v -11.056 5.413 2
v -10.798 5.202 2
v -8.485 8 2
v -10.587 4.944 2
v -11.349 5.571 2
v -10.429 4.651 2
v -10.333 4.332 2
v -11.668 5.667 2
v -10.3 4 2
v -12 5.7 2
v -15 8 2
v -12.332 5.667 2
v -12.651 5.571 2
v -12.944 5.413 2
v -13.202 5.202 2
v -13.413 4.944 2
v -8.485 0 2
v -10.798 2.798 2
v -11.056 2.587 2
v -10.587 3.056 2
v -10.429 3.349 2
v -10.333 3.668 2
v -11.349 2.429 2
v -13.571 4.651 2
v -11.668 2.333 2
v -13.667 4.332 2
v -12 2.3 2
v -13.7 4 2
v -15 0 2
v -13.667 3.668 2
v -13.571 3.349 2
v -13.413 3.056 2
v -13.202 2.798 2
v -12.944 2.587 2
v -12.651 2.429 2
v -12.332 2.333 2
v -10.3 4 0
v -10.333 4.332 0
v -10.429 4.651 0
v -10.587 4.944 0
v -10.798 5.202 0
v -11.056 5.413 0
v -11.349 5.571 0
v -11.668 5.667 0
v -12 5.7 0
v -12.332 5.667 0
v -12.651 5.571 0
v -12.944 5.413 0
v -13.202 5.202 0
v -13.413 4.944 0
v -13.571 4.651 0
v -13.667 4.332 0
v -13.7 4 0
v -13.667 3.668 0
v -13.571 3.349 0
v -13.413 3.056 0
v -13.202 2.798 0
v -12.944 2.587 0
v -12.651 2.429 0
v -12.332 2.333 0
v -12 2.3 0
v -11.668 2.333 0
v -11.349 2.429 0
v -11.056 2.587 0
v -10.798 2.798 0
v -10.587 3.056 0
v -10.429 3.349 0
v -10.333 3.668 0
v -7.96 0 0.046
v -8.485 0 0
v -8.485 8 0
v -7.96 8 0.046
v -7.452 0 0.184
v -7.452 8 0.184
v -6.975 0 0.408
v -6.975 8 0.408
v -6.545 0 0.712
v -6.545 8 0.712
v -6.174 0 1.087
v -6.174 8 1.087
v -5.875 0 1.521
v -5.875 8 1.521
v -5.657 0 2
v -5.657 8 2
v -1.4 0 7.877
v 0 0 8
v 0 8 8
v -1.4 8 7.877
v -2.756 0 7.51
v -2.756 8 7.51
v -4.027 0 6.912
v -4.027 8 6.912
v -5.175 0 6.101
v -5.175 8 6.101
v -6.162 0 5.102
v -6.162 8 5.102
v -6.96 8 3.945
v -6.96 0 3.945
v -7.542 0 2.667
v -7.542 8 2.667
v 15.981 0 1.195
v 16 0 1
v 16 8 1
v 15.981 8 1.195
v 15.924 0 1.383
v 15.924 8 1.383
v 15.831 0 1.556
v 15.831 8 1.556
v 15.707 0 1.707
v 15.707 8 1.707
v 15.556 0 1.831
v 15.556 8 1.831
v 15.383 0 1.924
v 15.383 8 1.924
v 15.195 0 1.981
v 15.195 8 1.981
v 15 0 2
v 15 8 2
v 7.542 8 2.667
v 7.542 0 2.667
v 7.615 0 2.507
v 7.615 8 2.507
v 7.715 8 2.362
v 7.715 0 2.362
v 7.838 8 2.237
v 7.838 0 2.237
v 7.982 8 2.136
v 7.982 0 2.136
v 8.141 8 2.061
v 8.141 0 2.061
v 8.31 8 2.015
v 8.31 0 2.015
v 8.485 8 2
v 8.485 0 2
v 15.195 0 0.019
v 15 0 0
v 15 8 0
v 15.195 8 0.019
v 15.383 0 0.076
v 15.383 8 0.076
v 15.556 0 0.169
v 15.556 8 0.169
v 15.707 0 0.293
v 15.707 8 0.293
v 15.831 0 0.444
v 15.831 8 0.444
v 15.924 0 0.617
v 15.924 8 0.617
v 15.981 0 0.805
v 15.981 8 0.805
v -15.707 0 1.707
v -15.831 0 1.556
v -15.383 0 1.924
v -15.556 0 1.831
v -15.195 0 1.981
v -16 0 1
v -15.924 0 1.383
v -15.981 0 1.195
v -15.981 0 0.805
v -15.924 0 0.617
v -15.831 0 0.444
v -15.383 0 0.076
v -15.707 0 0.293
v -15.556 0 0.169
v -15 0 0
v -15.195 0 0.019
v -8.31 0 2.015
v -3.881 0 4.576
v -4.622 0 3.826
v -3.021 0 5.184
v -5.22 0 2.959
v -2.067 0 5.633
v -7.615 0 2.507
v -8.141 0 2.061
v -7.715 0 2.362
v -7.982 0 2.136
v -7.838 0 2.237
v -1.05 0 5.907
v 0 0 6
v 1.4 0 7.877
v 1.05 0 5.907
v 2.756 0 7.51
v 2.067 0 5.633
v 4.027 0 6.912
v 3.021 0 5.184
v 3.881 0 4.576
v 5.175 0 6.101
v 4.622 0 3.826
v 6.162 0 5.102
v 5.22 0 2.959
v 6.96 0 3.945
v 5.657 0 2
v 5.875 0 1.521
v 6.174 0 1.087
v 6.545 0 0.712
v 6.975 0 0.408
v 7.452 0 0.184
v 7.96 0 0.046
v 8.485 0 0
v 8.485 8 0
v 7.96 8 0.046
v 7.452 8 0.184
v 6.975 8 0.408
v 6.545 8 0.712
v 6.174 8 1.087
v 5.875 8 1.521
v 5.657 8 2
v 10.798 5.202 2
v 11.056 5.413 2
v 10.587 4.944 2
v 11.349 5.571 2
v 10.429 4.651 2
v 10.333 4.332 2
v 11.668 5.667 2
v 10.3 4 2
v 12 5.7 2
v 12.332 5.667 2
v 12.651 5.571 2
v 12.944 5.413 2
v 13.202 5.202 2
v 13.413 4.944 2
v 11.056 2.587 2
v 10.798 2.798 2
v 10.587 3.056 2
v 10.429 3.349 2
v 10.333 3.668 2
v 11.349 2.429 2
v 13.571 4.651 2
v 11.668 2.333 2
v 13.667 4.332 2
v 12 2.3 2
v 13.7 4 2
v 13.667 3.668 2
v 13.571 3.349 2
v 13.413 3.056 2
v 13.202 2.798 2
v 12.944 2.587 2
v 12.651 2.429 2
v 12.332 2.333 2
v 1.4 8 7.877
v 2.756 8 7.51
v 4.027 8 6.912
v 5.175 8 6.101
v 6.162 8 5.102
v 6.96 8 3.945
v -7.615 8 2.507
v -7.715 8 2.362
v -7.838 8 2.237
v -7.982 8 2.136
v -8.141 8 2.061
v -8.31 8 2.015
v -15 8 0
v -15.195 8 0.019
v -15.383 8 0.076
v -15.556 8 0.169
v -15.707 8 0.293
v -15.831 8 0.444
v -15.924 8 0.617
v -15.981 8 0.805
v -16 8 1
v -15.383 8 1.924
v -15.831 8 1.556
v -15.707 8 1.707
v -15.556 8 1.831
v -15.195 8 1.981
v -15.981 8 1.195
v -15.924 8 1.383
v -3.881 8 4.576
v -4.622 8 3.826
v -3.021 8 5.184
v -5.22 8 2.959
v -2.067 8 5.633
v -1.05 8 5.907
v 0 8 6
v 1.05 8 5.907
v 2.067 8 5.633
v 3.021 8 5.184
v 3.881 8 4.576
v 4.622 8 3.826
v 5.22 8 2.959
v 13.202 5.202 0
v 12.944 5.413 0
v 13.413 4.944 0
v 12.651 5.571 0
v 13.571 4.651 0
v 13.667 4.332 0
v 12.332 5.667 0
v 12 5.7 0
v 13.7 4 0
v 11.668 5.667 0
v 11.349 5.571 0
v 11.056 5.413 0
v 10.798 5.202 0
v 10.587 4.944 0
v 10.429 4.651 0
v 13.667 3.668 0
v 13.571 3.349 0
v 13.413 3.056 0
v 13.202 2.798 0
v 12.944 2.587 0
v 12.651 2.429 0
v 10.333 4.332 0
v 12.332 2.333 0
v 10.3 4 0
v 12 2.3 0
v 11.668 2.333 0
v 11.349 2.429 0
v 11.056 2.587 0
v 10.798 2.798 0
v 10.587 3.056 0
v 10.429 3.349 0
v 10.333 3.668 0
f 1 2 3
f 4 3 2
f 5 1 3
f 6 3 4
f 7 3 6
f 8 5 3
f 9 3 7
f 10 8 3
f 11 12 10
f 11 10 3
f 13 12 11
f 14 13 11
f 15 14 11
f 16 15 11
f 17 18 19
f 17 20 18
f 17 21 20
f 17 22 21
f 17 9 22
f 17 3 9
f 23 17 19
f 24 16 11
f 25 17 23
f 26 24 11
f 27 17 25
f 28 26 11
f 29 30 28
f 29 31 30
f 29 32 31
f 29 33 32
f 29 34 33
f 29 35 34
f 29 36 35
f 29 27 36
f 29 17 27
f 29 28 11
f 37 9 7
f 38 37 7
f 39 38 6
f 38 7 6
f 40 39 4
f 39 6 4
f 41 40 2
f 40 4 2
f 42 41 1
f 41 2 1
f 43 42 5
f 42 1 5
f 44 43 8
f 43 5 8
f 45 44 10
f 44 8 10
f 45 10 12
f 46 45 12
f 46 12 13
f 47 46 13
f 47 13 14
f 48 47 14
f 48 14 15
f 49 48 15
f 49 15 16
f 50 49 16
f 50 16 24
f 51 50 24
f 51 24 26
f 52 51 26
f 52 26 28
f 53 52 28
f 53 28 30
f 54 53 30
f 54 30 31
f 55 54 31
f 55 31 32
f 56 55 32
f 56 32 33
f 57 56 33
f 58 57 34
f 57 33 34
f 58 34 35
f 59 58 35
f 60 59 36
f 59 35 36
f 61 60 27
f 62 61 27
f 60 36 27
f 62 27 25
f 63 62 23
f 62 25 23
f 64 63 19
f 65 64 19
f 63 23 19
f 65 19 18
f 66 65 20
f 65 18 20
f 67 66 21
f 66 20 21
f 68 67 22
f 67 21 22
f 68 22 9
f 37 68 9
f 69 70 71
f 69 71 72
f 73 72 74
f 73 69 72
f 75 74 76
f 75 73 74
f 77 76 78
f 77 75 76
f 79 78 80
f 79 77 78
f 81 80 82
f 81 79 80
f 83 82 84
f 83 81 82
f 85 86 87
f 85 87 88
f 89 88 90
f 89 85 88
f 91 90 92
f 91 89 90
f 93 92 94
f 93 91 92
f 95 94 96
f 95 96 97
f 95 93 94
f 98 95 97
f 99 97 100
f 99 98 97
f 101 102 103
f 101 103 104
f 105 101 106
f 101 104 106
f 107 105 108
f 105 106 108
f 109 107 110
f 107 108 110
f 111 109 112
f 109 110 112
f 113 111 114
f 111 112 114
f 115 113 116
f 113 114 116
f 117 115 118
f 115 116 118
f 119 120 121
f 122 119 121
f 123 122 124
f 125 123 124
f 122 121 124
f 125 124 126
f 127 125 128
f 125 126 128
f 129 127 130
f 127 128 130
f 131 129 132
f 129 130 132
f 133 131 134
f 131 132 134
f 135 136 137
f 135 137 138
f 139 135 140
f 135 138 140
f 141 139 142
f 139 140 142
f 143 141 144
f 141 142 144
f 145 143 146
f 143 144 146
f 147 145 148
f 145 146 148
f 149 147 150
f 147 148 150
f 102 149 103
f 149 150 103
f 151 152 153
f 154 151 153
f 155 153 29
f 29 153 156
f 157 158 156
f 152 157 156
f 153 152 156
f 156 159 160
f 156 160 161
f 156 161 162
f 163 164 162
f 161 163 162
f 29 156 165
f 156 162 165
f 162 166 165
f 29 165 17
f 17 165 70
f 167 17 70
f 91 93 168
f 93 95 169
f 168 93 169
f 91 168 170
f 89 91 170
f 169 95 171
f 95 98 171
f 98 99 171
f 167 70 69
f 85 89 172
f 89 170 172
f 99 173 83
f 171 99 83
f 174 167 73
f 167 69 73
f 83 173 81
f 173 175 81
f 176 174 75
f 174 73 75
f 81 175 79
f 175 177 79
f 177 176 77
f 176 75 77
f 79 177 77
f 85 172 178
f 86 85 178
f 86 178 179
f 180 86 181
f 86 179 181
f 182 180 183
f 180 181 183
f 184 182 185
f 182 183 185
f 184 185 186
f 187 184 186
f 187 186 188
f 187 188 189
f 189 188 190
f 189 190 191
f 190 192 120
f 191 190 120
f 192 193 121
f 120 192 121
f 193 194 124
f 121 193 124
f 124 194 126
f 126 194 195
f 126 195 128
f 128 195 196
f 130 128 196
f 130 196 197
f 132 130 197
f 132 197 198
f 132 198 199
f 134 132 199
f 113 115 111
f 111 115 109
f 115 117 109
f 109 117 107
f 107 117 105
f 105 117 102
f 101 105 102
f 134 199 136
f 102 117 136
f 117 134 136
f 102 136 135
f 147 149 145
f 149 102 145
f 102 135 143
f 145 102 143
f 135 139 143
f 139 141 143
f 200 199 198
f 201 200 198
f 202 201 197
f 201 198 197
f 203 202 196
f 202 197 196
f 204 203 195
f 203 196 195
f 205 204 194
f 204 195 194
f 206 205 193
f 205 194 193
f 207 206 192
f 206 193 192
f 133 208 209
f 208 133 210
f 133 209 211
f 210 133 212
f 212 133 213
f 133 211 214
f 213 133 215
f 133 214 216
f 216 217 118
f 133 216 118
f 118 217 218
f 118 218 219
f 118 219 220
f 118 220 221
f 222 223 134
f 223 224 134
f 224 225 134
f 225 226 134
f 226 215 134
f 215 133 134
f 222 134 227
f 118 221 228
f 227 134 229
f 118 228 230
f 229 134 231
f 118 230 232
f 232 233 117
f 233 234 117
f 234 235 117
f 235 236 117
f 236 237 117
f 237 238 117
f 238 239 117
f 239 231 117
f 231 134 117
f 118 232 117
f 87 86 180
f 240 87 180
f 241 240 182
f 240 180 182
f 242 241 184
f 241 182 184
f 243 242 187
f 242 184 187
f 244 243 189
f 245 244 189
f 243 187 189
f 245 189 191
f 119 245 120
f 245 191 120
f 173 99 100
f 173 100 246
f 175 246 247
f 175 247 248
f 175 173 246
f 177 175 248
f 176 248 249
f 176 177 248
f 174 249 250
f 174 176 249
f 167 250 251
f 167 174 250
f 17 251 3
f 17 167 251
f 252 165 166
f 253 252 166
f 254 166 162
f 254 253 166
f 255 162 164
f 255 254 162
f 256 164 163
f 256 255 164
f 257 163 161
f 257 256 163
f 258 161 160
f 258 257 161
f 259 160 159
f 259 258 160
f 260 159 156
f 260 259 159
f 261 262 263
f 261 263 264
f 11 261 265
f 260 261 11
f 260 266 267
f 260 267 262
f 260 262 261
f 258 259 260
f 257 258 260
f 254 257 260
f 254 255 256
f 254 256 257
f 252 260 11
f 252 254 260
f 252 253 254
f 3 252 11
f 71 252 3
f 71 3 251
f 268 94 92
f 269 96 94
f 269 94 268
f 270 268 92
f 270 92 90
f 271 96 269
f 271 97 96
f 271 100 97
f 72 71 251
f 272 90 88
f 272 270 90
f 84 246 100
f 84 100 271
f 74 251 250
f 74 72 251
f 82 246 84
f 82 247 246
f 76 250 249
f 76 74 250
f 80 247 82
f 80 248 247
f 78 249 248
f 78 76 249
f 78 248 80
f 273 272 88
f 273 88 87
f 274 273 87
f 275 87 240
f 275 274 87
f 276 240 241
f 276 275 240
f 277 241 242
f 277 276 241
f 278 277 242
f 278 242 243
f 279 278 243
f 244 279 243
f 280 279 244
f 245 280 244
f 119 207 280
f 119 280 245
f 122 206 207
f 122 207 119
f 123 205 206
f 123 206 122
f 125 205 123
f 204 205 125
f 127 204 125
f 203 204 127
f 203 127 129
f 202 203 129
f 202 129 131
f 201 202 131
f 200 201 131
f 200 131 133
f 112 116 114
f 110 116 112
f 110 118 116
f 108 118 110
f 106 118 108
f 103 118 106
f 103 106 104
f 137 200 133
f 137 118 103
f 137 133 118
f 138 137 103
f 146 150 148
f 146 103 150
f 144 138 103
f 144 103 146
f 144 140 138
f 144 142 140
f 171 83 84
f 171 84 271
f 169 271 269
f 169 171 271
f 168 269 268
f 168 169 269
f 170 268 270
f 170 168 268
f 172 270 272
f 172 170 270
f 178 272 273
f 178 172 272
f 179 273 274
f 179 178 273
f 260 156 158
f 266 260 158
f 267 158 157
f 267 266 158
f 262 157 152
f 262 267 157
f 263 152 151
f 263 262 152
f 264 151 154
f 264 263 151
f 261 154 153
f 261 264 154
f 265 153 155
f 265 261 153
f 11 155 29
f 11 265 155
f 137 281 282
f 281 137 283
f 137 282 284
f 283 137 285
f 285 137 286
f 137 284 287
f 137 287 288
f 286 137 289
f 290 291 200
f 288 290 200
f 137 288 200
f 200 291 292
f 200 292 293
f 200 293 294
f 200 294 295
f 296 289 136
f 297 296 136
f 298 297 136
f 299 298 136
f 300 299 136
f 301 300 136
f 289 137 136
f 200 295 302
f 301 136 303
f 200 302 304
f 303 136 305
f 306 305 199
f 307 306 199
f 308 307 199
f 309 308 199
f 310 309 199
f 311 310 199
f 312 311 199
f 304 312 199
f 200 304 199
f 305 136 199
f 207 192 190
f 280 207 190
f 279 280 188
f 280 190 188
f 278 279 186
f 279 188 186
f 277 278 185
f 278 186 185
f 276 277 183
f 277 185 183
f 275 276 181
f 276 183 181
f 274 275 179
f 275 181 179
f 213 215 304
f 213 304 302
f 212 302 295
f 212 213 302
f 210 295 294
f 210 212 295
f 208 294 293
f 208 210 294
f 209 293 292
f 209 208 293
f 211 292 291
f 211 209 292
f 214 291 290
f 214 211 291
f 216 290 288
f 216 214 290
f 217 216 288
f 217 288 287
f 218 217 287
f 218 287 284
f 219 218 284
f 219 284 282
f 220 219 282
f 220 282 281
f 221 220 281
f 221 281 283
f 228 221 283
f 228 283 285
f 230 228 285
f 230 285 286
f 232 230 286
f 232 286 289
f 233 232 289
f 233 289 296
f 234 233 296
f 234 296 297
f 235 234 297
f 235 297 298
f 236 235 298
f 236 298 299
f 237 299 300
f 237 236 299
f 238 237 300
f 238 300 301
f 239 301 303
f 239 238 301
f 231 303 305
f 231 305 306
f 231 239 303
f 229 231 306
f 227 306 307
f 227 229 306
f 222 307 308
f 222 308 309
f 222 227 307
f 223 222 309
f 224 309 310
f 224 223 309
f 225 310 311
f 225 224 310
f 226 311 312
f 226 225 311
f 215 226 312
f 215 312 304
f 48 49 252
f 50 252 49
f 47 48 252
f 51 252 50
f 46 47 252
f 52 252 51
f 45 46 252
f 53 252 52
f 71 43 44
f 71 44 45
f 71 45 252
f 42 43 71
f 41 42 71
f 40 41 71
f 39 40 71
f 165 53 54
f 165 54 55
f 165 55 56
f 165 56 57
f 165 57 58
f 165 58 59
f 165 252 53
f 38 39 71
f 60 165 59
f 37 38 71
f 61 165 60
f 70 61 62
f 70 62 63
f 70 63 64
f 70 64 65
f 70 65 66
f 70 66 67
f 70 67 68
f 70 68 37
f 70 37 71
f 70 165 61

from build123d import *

# Parameters (mm, degrees)
BOSS_EXTRUDE1_DEPTH = 8
SKETCH2_R           = 1.7
CUT_EXTRUDE1_DEPTH  = 19.867962264
FILLET1_R           = 1


with BuildPart() as part:
    # Sketch1 → Boss-Extrude1 (new body)
    with BuildSketch(Plane(origin=(0, 0, 0), x_dir=(1, 0, 0), z_dir=(0, 1, 0))):
        with BuildLine():
            Line((-16, 0), (-8.485281374, 0))
            ThreePointArc((-8.485281374, 0), (-6.753230567, -0.550510257), (-5.656854249, -2))
            ThreePointArc((-5.656854249, -2), (-3.464101615, -4.898979486), (0, -6))
            Line((0, -6), (0, -8))
            ThreePointArc((0, -8), (-4.618802154, -6.531972647), (-7.542472333, -2.666666667))
            ThreePointArc((-7.542472333, -2.666666667), (-7.907931105, -2.183503419), (-8.485281374, -2))
            Line((-8.485281374, -2), (-16, -2))
            Line((-16, -2), (-16, 0))
        make_face()
    extrude(amount=BOSS_EXTRUDE1_DEPTH)

    # Sketch2 → Cut-Extrude1 (cut, through all)
    with BuildSketch(Plane.XY.offset(2)):
        with Locations((-12, 4)):
            Circle(SKETCH2_R)
    extrude(amount=-CUT_EXTRUDE1_DEPTH, mode=Mode.SUBTRACT)

    # Fillet1
    fillet1_edges = [part.edges().sort_by_distance(p)[0] for p in [
        (-16, 4, 0),
        (-16, 4, 2),
    ]]
    fillet(fillet1_edges, radius=FILLET1_R - 0.0001)  # a hair under: the kernel refuses the full size

    # Mirror1: part across plane


with BuildPart() as part_1:
    add(part.part)
    add(part.part.mirror(Plane(origin=(0, 8, 6), x_dir=(0, 0, 1), z_dir=(-1, 0, 0))))


solid = part_1.part
